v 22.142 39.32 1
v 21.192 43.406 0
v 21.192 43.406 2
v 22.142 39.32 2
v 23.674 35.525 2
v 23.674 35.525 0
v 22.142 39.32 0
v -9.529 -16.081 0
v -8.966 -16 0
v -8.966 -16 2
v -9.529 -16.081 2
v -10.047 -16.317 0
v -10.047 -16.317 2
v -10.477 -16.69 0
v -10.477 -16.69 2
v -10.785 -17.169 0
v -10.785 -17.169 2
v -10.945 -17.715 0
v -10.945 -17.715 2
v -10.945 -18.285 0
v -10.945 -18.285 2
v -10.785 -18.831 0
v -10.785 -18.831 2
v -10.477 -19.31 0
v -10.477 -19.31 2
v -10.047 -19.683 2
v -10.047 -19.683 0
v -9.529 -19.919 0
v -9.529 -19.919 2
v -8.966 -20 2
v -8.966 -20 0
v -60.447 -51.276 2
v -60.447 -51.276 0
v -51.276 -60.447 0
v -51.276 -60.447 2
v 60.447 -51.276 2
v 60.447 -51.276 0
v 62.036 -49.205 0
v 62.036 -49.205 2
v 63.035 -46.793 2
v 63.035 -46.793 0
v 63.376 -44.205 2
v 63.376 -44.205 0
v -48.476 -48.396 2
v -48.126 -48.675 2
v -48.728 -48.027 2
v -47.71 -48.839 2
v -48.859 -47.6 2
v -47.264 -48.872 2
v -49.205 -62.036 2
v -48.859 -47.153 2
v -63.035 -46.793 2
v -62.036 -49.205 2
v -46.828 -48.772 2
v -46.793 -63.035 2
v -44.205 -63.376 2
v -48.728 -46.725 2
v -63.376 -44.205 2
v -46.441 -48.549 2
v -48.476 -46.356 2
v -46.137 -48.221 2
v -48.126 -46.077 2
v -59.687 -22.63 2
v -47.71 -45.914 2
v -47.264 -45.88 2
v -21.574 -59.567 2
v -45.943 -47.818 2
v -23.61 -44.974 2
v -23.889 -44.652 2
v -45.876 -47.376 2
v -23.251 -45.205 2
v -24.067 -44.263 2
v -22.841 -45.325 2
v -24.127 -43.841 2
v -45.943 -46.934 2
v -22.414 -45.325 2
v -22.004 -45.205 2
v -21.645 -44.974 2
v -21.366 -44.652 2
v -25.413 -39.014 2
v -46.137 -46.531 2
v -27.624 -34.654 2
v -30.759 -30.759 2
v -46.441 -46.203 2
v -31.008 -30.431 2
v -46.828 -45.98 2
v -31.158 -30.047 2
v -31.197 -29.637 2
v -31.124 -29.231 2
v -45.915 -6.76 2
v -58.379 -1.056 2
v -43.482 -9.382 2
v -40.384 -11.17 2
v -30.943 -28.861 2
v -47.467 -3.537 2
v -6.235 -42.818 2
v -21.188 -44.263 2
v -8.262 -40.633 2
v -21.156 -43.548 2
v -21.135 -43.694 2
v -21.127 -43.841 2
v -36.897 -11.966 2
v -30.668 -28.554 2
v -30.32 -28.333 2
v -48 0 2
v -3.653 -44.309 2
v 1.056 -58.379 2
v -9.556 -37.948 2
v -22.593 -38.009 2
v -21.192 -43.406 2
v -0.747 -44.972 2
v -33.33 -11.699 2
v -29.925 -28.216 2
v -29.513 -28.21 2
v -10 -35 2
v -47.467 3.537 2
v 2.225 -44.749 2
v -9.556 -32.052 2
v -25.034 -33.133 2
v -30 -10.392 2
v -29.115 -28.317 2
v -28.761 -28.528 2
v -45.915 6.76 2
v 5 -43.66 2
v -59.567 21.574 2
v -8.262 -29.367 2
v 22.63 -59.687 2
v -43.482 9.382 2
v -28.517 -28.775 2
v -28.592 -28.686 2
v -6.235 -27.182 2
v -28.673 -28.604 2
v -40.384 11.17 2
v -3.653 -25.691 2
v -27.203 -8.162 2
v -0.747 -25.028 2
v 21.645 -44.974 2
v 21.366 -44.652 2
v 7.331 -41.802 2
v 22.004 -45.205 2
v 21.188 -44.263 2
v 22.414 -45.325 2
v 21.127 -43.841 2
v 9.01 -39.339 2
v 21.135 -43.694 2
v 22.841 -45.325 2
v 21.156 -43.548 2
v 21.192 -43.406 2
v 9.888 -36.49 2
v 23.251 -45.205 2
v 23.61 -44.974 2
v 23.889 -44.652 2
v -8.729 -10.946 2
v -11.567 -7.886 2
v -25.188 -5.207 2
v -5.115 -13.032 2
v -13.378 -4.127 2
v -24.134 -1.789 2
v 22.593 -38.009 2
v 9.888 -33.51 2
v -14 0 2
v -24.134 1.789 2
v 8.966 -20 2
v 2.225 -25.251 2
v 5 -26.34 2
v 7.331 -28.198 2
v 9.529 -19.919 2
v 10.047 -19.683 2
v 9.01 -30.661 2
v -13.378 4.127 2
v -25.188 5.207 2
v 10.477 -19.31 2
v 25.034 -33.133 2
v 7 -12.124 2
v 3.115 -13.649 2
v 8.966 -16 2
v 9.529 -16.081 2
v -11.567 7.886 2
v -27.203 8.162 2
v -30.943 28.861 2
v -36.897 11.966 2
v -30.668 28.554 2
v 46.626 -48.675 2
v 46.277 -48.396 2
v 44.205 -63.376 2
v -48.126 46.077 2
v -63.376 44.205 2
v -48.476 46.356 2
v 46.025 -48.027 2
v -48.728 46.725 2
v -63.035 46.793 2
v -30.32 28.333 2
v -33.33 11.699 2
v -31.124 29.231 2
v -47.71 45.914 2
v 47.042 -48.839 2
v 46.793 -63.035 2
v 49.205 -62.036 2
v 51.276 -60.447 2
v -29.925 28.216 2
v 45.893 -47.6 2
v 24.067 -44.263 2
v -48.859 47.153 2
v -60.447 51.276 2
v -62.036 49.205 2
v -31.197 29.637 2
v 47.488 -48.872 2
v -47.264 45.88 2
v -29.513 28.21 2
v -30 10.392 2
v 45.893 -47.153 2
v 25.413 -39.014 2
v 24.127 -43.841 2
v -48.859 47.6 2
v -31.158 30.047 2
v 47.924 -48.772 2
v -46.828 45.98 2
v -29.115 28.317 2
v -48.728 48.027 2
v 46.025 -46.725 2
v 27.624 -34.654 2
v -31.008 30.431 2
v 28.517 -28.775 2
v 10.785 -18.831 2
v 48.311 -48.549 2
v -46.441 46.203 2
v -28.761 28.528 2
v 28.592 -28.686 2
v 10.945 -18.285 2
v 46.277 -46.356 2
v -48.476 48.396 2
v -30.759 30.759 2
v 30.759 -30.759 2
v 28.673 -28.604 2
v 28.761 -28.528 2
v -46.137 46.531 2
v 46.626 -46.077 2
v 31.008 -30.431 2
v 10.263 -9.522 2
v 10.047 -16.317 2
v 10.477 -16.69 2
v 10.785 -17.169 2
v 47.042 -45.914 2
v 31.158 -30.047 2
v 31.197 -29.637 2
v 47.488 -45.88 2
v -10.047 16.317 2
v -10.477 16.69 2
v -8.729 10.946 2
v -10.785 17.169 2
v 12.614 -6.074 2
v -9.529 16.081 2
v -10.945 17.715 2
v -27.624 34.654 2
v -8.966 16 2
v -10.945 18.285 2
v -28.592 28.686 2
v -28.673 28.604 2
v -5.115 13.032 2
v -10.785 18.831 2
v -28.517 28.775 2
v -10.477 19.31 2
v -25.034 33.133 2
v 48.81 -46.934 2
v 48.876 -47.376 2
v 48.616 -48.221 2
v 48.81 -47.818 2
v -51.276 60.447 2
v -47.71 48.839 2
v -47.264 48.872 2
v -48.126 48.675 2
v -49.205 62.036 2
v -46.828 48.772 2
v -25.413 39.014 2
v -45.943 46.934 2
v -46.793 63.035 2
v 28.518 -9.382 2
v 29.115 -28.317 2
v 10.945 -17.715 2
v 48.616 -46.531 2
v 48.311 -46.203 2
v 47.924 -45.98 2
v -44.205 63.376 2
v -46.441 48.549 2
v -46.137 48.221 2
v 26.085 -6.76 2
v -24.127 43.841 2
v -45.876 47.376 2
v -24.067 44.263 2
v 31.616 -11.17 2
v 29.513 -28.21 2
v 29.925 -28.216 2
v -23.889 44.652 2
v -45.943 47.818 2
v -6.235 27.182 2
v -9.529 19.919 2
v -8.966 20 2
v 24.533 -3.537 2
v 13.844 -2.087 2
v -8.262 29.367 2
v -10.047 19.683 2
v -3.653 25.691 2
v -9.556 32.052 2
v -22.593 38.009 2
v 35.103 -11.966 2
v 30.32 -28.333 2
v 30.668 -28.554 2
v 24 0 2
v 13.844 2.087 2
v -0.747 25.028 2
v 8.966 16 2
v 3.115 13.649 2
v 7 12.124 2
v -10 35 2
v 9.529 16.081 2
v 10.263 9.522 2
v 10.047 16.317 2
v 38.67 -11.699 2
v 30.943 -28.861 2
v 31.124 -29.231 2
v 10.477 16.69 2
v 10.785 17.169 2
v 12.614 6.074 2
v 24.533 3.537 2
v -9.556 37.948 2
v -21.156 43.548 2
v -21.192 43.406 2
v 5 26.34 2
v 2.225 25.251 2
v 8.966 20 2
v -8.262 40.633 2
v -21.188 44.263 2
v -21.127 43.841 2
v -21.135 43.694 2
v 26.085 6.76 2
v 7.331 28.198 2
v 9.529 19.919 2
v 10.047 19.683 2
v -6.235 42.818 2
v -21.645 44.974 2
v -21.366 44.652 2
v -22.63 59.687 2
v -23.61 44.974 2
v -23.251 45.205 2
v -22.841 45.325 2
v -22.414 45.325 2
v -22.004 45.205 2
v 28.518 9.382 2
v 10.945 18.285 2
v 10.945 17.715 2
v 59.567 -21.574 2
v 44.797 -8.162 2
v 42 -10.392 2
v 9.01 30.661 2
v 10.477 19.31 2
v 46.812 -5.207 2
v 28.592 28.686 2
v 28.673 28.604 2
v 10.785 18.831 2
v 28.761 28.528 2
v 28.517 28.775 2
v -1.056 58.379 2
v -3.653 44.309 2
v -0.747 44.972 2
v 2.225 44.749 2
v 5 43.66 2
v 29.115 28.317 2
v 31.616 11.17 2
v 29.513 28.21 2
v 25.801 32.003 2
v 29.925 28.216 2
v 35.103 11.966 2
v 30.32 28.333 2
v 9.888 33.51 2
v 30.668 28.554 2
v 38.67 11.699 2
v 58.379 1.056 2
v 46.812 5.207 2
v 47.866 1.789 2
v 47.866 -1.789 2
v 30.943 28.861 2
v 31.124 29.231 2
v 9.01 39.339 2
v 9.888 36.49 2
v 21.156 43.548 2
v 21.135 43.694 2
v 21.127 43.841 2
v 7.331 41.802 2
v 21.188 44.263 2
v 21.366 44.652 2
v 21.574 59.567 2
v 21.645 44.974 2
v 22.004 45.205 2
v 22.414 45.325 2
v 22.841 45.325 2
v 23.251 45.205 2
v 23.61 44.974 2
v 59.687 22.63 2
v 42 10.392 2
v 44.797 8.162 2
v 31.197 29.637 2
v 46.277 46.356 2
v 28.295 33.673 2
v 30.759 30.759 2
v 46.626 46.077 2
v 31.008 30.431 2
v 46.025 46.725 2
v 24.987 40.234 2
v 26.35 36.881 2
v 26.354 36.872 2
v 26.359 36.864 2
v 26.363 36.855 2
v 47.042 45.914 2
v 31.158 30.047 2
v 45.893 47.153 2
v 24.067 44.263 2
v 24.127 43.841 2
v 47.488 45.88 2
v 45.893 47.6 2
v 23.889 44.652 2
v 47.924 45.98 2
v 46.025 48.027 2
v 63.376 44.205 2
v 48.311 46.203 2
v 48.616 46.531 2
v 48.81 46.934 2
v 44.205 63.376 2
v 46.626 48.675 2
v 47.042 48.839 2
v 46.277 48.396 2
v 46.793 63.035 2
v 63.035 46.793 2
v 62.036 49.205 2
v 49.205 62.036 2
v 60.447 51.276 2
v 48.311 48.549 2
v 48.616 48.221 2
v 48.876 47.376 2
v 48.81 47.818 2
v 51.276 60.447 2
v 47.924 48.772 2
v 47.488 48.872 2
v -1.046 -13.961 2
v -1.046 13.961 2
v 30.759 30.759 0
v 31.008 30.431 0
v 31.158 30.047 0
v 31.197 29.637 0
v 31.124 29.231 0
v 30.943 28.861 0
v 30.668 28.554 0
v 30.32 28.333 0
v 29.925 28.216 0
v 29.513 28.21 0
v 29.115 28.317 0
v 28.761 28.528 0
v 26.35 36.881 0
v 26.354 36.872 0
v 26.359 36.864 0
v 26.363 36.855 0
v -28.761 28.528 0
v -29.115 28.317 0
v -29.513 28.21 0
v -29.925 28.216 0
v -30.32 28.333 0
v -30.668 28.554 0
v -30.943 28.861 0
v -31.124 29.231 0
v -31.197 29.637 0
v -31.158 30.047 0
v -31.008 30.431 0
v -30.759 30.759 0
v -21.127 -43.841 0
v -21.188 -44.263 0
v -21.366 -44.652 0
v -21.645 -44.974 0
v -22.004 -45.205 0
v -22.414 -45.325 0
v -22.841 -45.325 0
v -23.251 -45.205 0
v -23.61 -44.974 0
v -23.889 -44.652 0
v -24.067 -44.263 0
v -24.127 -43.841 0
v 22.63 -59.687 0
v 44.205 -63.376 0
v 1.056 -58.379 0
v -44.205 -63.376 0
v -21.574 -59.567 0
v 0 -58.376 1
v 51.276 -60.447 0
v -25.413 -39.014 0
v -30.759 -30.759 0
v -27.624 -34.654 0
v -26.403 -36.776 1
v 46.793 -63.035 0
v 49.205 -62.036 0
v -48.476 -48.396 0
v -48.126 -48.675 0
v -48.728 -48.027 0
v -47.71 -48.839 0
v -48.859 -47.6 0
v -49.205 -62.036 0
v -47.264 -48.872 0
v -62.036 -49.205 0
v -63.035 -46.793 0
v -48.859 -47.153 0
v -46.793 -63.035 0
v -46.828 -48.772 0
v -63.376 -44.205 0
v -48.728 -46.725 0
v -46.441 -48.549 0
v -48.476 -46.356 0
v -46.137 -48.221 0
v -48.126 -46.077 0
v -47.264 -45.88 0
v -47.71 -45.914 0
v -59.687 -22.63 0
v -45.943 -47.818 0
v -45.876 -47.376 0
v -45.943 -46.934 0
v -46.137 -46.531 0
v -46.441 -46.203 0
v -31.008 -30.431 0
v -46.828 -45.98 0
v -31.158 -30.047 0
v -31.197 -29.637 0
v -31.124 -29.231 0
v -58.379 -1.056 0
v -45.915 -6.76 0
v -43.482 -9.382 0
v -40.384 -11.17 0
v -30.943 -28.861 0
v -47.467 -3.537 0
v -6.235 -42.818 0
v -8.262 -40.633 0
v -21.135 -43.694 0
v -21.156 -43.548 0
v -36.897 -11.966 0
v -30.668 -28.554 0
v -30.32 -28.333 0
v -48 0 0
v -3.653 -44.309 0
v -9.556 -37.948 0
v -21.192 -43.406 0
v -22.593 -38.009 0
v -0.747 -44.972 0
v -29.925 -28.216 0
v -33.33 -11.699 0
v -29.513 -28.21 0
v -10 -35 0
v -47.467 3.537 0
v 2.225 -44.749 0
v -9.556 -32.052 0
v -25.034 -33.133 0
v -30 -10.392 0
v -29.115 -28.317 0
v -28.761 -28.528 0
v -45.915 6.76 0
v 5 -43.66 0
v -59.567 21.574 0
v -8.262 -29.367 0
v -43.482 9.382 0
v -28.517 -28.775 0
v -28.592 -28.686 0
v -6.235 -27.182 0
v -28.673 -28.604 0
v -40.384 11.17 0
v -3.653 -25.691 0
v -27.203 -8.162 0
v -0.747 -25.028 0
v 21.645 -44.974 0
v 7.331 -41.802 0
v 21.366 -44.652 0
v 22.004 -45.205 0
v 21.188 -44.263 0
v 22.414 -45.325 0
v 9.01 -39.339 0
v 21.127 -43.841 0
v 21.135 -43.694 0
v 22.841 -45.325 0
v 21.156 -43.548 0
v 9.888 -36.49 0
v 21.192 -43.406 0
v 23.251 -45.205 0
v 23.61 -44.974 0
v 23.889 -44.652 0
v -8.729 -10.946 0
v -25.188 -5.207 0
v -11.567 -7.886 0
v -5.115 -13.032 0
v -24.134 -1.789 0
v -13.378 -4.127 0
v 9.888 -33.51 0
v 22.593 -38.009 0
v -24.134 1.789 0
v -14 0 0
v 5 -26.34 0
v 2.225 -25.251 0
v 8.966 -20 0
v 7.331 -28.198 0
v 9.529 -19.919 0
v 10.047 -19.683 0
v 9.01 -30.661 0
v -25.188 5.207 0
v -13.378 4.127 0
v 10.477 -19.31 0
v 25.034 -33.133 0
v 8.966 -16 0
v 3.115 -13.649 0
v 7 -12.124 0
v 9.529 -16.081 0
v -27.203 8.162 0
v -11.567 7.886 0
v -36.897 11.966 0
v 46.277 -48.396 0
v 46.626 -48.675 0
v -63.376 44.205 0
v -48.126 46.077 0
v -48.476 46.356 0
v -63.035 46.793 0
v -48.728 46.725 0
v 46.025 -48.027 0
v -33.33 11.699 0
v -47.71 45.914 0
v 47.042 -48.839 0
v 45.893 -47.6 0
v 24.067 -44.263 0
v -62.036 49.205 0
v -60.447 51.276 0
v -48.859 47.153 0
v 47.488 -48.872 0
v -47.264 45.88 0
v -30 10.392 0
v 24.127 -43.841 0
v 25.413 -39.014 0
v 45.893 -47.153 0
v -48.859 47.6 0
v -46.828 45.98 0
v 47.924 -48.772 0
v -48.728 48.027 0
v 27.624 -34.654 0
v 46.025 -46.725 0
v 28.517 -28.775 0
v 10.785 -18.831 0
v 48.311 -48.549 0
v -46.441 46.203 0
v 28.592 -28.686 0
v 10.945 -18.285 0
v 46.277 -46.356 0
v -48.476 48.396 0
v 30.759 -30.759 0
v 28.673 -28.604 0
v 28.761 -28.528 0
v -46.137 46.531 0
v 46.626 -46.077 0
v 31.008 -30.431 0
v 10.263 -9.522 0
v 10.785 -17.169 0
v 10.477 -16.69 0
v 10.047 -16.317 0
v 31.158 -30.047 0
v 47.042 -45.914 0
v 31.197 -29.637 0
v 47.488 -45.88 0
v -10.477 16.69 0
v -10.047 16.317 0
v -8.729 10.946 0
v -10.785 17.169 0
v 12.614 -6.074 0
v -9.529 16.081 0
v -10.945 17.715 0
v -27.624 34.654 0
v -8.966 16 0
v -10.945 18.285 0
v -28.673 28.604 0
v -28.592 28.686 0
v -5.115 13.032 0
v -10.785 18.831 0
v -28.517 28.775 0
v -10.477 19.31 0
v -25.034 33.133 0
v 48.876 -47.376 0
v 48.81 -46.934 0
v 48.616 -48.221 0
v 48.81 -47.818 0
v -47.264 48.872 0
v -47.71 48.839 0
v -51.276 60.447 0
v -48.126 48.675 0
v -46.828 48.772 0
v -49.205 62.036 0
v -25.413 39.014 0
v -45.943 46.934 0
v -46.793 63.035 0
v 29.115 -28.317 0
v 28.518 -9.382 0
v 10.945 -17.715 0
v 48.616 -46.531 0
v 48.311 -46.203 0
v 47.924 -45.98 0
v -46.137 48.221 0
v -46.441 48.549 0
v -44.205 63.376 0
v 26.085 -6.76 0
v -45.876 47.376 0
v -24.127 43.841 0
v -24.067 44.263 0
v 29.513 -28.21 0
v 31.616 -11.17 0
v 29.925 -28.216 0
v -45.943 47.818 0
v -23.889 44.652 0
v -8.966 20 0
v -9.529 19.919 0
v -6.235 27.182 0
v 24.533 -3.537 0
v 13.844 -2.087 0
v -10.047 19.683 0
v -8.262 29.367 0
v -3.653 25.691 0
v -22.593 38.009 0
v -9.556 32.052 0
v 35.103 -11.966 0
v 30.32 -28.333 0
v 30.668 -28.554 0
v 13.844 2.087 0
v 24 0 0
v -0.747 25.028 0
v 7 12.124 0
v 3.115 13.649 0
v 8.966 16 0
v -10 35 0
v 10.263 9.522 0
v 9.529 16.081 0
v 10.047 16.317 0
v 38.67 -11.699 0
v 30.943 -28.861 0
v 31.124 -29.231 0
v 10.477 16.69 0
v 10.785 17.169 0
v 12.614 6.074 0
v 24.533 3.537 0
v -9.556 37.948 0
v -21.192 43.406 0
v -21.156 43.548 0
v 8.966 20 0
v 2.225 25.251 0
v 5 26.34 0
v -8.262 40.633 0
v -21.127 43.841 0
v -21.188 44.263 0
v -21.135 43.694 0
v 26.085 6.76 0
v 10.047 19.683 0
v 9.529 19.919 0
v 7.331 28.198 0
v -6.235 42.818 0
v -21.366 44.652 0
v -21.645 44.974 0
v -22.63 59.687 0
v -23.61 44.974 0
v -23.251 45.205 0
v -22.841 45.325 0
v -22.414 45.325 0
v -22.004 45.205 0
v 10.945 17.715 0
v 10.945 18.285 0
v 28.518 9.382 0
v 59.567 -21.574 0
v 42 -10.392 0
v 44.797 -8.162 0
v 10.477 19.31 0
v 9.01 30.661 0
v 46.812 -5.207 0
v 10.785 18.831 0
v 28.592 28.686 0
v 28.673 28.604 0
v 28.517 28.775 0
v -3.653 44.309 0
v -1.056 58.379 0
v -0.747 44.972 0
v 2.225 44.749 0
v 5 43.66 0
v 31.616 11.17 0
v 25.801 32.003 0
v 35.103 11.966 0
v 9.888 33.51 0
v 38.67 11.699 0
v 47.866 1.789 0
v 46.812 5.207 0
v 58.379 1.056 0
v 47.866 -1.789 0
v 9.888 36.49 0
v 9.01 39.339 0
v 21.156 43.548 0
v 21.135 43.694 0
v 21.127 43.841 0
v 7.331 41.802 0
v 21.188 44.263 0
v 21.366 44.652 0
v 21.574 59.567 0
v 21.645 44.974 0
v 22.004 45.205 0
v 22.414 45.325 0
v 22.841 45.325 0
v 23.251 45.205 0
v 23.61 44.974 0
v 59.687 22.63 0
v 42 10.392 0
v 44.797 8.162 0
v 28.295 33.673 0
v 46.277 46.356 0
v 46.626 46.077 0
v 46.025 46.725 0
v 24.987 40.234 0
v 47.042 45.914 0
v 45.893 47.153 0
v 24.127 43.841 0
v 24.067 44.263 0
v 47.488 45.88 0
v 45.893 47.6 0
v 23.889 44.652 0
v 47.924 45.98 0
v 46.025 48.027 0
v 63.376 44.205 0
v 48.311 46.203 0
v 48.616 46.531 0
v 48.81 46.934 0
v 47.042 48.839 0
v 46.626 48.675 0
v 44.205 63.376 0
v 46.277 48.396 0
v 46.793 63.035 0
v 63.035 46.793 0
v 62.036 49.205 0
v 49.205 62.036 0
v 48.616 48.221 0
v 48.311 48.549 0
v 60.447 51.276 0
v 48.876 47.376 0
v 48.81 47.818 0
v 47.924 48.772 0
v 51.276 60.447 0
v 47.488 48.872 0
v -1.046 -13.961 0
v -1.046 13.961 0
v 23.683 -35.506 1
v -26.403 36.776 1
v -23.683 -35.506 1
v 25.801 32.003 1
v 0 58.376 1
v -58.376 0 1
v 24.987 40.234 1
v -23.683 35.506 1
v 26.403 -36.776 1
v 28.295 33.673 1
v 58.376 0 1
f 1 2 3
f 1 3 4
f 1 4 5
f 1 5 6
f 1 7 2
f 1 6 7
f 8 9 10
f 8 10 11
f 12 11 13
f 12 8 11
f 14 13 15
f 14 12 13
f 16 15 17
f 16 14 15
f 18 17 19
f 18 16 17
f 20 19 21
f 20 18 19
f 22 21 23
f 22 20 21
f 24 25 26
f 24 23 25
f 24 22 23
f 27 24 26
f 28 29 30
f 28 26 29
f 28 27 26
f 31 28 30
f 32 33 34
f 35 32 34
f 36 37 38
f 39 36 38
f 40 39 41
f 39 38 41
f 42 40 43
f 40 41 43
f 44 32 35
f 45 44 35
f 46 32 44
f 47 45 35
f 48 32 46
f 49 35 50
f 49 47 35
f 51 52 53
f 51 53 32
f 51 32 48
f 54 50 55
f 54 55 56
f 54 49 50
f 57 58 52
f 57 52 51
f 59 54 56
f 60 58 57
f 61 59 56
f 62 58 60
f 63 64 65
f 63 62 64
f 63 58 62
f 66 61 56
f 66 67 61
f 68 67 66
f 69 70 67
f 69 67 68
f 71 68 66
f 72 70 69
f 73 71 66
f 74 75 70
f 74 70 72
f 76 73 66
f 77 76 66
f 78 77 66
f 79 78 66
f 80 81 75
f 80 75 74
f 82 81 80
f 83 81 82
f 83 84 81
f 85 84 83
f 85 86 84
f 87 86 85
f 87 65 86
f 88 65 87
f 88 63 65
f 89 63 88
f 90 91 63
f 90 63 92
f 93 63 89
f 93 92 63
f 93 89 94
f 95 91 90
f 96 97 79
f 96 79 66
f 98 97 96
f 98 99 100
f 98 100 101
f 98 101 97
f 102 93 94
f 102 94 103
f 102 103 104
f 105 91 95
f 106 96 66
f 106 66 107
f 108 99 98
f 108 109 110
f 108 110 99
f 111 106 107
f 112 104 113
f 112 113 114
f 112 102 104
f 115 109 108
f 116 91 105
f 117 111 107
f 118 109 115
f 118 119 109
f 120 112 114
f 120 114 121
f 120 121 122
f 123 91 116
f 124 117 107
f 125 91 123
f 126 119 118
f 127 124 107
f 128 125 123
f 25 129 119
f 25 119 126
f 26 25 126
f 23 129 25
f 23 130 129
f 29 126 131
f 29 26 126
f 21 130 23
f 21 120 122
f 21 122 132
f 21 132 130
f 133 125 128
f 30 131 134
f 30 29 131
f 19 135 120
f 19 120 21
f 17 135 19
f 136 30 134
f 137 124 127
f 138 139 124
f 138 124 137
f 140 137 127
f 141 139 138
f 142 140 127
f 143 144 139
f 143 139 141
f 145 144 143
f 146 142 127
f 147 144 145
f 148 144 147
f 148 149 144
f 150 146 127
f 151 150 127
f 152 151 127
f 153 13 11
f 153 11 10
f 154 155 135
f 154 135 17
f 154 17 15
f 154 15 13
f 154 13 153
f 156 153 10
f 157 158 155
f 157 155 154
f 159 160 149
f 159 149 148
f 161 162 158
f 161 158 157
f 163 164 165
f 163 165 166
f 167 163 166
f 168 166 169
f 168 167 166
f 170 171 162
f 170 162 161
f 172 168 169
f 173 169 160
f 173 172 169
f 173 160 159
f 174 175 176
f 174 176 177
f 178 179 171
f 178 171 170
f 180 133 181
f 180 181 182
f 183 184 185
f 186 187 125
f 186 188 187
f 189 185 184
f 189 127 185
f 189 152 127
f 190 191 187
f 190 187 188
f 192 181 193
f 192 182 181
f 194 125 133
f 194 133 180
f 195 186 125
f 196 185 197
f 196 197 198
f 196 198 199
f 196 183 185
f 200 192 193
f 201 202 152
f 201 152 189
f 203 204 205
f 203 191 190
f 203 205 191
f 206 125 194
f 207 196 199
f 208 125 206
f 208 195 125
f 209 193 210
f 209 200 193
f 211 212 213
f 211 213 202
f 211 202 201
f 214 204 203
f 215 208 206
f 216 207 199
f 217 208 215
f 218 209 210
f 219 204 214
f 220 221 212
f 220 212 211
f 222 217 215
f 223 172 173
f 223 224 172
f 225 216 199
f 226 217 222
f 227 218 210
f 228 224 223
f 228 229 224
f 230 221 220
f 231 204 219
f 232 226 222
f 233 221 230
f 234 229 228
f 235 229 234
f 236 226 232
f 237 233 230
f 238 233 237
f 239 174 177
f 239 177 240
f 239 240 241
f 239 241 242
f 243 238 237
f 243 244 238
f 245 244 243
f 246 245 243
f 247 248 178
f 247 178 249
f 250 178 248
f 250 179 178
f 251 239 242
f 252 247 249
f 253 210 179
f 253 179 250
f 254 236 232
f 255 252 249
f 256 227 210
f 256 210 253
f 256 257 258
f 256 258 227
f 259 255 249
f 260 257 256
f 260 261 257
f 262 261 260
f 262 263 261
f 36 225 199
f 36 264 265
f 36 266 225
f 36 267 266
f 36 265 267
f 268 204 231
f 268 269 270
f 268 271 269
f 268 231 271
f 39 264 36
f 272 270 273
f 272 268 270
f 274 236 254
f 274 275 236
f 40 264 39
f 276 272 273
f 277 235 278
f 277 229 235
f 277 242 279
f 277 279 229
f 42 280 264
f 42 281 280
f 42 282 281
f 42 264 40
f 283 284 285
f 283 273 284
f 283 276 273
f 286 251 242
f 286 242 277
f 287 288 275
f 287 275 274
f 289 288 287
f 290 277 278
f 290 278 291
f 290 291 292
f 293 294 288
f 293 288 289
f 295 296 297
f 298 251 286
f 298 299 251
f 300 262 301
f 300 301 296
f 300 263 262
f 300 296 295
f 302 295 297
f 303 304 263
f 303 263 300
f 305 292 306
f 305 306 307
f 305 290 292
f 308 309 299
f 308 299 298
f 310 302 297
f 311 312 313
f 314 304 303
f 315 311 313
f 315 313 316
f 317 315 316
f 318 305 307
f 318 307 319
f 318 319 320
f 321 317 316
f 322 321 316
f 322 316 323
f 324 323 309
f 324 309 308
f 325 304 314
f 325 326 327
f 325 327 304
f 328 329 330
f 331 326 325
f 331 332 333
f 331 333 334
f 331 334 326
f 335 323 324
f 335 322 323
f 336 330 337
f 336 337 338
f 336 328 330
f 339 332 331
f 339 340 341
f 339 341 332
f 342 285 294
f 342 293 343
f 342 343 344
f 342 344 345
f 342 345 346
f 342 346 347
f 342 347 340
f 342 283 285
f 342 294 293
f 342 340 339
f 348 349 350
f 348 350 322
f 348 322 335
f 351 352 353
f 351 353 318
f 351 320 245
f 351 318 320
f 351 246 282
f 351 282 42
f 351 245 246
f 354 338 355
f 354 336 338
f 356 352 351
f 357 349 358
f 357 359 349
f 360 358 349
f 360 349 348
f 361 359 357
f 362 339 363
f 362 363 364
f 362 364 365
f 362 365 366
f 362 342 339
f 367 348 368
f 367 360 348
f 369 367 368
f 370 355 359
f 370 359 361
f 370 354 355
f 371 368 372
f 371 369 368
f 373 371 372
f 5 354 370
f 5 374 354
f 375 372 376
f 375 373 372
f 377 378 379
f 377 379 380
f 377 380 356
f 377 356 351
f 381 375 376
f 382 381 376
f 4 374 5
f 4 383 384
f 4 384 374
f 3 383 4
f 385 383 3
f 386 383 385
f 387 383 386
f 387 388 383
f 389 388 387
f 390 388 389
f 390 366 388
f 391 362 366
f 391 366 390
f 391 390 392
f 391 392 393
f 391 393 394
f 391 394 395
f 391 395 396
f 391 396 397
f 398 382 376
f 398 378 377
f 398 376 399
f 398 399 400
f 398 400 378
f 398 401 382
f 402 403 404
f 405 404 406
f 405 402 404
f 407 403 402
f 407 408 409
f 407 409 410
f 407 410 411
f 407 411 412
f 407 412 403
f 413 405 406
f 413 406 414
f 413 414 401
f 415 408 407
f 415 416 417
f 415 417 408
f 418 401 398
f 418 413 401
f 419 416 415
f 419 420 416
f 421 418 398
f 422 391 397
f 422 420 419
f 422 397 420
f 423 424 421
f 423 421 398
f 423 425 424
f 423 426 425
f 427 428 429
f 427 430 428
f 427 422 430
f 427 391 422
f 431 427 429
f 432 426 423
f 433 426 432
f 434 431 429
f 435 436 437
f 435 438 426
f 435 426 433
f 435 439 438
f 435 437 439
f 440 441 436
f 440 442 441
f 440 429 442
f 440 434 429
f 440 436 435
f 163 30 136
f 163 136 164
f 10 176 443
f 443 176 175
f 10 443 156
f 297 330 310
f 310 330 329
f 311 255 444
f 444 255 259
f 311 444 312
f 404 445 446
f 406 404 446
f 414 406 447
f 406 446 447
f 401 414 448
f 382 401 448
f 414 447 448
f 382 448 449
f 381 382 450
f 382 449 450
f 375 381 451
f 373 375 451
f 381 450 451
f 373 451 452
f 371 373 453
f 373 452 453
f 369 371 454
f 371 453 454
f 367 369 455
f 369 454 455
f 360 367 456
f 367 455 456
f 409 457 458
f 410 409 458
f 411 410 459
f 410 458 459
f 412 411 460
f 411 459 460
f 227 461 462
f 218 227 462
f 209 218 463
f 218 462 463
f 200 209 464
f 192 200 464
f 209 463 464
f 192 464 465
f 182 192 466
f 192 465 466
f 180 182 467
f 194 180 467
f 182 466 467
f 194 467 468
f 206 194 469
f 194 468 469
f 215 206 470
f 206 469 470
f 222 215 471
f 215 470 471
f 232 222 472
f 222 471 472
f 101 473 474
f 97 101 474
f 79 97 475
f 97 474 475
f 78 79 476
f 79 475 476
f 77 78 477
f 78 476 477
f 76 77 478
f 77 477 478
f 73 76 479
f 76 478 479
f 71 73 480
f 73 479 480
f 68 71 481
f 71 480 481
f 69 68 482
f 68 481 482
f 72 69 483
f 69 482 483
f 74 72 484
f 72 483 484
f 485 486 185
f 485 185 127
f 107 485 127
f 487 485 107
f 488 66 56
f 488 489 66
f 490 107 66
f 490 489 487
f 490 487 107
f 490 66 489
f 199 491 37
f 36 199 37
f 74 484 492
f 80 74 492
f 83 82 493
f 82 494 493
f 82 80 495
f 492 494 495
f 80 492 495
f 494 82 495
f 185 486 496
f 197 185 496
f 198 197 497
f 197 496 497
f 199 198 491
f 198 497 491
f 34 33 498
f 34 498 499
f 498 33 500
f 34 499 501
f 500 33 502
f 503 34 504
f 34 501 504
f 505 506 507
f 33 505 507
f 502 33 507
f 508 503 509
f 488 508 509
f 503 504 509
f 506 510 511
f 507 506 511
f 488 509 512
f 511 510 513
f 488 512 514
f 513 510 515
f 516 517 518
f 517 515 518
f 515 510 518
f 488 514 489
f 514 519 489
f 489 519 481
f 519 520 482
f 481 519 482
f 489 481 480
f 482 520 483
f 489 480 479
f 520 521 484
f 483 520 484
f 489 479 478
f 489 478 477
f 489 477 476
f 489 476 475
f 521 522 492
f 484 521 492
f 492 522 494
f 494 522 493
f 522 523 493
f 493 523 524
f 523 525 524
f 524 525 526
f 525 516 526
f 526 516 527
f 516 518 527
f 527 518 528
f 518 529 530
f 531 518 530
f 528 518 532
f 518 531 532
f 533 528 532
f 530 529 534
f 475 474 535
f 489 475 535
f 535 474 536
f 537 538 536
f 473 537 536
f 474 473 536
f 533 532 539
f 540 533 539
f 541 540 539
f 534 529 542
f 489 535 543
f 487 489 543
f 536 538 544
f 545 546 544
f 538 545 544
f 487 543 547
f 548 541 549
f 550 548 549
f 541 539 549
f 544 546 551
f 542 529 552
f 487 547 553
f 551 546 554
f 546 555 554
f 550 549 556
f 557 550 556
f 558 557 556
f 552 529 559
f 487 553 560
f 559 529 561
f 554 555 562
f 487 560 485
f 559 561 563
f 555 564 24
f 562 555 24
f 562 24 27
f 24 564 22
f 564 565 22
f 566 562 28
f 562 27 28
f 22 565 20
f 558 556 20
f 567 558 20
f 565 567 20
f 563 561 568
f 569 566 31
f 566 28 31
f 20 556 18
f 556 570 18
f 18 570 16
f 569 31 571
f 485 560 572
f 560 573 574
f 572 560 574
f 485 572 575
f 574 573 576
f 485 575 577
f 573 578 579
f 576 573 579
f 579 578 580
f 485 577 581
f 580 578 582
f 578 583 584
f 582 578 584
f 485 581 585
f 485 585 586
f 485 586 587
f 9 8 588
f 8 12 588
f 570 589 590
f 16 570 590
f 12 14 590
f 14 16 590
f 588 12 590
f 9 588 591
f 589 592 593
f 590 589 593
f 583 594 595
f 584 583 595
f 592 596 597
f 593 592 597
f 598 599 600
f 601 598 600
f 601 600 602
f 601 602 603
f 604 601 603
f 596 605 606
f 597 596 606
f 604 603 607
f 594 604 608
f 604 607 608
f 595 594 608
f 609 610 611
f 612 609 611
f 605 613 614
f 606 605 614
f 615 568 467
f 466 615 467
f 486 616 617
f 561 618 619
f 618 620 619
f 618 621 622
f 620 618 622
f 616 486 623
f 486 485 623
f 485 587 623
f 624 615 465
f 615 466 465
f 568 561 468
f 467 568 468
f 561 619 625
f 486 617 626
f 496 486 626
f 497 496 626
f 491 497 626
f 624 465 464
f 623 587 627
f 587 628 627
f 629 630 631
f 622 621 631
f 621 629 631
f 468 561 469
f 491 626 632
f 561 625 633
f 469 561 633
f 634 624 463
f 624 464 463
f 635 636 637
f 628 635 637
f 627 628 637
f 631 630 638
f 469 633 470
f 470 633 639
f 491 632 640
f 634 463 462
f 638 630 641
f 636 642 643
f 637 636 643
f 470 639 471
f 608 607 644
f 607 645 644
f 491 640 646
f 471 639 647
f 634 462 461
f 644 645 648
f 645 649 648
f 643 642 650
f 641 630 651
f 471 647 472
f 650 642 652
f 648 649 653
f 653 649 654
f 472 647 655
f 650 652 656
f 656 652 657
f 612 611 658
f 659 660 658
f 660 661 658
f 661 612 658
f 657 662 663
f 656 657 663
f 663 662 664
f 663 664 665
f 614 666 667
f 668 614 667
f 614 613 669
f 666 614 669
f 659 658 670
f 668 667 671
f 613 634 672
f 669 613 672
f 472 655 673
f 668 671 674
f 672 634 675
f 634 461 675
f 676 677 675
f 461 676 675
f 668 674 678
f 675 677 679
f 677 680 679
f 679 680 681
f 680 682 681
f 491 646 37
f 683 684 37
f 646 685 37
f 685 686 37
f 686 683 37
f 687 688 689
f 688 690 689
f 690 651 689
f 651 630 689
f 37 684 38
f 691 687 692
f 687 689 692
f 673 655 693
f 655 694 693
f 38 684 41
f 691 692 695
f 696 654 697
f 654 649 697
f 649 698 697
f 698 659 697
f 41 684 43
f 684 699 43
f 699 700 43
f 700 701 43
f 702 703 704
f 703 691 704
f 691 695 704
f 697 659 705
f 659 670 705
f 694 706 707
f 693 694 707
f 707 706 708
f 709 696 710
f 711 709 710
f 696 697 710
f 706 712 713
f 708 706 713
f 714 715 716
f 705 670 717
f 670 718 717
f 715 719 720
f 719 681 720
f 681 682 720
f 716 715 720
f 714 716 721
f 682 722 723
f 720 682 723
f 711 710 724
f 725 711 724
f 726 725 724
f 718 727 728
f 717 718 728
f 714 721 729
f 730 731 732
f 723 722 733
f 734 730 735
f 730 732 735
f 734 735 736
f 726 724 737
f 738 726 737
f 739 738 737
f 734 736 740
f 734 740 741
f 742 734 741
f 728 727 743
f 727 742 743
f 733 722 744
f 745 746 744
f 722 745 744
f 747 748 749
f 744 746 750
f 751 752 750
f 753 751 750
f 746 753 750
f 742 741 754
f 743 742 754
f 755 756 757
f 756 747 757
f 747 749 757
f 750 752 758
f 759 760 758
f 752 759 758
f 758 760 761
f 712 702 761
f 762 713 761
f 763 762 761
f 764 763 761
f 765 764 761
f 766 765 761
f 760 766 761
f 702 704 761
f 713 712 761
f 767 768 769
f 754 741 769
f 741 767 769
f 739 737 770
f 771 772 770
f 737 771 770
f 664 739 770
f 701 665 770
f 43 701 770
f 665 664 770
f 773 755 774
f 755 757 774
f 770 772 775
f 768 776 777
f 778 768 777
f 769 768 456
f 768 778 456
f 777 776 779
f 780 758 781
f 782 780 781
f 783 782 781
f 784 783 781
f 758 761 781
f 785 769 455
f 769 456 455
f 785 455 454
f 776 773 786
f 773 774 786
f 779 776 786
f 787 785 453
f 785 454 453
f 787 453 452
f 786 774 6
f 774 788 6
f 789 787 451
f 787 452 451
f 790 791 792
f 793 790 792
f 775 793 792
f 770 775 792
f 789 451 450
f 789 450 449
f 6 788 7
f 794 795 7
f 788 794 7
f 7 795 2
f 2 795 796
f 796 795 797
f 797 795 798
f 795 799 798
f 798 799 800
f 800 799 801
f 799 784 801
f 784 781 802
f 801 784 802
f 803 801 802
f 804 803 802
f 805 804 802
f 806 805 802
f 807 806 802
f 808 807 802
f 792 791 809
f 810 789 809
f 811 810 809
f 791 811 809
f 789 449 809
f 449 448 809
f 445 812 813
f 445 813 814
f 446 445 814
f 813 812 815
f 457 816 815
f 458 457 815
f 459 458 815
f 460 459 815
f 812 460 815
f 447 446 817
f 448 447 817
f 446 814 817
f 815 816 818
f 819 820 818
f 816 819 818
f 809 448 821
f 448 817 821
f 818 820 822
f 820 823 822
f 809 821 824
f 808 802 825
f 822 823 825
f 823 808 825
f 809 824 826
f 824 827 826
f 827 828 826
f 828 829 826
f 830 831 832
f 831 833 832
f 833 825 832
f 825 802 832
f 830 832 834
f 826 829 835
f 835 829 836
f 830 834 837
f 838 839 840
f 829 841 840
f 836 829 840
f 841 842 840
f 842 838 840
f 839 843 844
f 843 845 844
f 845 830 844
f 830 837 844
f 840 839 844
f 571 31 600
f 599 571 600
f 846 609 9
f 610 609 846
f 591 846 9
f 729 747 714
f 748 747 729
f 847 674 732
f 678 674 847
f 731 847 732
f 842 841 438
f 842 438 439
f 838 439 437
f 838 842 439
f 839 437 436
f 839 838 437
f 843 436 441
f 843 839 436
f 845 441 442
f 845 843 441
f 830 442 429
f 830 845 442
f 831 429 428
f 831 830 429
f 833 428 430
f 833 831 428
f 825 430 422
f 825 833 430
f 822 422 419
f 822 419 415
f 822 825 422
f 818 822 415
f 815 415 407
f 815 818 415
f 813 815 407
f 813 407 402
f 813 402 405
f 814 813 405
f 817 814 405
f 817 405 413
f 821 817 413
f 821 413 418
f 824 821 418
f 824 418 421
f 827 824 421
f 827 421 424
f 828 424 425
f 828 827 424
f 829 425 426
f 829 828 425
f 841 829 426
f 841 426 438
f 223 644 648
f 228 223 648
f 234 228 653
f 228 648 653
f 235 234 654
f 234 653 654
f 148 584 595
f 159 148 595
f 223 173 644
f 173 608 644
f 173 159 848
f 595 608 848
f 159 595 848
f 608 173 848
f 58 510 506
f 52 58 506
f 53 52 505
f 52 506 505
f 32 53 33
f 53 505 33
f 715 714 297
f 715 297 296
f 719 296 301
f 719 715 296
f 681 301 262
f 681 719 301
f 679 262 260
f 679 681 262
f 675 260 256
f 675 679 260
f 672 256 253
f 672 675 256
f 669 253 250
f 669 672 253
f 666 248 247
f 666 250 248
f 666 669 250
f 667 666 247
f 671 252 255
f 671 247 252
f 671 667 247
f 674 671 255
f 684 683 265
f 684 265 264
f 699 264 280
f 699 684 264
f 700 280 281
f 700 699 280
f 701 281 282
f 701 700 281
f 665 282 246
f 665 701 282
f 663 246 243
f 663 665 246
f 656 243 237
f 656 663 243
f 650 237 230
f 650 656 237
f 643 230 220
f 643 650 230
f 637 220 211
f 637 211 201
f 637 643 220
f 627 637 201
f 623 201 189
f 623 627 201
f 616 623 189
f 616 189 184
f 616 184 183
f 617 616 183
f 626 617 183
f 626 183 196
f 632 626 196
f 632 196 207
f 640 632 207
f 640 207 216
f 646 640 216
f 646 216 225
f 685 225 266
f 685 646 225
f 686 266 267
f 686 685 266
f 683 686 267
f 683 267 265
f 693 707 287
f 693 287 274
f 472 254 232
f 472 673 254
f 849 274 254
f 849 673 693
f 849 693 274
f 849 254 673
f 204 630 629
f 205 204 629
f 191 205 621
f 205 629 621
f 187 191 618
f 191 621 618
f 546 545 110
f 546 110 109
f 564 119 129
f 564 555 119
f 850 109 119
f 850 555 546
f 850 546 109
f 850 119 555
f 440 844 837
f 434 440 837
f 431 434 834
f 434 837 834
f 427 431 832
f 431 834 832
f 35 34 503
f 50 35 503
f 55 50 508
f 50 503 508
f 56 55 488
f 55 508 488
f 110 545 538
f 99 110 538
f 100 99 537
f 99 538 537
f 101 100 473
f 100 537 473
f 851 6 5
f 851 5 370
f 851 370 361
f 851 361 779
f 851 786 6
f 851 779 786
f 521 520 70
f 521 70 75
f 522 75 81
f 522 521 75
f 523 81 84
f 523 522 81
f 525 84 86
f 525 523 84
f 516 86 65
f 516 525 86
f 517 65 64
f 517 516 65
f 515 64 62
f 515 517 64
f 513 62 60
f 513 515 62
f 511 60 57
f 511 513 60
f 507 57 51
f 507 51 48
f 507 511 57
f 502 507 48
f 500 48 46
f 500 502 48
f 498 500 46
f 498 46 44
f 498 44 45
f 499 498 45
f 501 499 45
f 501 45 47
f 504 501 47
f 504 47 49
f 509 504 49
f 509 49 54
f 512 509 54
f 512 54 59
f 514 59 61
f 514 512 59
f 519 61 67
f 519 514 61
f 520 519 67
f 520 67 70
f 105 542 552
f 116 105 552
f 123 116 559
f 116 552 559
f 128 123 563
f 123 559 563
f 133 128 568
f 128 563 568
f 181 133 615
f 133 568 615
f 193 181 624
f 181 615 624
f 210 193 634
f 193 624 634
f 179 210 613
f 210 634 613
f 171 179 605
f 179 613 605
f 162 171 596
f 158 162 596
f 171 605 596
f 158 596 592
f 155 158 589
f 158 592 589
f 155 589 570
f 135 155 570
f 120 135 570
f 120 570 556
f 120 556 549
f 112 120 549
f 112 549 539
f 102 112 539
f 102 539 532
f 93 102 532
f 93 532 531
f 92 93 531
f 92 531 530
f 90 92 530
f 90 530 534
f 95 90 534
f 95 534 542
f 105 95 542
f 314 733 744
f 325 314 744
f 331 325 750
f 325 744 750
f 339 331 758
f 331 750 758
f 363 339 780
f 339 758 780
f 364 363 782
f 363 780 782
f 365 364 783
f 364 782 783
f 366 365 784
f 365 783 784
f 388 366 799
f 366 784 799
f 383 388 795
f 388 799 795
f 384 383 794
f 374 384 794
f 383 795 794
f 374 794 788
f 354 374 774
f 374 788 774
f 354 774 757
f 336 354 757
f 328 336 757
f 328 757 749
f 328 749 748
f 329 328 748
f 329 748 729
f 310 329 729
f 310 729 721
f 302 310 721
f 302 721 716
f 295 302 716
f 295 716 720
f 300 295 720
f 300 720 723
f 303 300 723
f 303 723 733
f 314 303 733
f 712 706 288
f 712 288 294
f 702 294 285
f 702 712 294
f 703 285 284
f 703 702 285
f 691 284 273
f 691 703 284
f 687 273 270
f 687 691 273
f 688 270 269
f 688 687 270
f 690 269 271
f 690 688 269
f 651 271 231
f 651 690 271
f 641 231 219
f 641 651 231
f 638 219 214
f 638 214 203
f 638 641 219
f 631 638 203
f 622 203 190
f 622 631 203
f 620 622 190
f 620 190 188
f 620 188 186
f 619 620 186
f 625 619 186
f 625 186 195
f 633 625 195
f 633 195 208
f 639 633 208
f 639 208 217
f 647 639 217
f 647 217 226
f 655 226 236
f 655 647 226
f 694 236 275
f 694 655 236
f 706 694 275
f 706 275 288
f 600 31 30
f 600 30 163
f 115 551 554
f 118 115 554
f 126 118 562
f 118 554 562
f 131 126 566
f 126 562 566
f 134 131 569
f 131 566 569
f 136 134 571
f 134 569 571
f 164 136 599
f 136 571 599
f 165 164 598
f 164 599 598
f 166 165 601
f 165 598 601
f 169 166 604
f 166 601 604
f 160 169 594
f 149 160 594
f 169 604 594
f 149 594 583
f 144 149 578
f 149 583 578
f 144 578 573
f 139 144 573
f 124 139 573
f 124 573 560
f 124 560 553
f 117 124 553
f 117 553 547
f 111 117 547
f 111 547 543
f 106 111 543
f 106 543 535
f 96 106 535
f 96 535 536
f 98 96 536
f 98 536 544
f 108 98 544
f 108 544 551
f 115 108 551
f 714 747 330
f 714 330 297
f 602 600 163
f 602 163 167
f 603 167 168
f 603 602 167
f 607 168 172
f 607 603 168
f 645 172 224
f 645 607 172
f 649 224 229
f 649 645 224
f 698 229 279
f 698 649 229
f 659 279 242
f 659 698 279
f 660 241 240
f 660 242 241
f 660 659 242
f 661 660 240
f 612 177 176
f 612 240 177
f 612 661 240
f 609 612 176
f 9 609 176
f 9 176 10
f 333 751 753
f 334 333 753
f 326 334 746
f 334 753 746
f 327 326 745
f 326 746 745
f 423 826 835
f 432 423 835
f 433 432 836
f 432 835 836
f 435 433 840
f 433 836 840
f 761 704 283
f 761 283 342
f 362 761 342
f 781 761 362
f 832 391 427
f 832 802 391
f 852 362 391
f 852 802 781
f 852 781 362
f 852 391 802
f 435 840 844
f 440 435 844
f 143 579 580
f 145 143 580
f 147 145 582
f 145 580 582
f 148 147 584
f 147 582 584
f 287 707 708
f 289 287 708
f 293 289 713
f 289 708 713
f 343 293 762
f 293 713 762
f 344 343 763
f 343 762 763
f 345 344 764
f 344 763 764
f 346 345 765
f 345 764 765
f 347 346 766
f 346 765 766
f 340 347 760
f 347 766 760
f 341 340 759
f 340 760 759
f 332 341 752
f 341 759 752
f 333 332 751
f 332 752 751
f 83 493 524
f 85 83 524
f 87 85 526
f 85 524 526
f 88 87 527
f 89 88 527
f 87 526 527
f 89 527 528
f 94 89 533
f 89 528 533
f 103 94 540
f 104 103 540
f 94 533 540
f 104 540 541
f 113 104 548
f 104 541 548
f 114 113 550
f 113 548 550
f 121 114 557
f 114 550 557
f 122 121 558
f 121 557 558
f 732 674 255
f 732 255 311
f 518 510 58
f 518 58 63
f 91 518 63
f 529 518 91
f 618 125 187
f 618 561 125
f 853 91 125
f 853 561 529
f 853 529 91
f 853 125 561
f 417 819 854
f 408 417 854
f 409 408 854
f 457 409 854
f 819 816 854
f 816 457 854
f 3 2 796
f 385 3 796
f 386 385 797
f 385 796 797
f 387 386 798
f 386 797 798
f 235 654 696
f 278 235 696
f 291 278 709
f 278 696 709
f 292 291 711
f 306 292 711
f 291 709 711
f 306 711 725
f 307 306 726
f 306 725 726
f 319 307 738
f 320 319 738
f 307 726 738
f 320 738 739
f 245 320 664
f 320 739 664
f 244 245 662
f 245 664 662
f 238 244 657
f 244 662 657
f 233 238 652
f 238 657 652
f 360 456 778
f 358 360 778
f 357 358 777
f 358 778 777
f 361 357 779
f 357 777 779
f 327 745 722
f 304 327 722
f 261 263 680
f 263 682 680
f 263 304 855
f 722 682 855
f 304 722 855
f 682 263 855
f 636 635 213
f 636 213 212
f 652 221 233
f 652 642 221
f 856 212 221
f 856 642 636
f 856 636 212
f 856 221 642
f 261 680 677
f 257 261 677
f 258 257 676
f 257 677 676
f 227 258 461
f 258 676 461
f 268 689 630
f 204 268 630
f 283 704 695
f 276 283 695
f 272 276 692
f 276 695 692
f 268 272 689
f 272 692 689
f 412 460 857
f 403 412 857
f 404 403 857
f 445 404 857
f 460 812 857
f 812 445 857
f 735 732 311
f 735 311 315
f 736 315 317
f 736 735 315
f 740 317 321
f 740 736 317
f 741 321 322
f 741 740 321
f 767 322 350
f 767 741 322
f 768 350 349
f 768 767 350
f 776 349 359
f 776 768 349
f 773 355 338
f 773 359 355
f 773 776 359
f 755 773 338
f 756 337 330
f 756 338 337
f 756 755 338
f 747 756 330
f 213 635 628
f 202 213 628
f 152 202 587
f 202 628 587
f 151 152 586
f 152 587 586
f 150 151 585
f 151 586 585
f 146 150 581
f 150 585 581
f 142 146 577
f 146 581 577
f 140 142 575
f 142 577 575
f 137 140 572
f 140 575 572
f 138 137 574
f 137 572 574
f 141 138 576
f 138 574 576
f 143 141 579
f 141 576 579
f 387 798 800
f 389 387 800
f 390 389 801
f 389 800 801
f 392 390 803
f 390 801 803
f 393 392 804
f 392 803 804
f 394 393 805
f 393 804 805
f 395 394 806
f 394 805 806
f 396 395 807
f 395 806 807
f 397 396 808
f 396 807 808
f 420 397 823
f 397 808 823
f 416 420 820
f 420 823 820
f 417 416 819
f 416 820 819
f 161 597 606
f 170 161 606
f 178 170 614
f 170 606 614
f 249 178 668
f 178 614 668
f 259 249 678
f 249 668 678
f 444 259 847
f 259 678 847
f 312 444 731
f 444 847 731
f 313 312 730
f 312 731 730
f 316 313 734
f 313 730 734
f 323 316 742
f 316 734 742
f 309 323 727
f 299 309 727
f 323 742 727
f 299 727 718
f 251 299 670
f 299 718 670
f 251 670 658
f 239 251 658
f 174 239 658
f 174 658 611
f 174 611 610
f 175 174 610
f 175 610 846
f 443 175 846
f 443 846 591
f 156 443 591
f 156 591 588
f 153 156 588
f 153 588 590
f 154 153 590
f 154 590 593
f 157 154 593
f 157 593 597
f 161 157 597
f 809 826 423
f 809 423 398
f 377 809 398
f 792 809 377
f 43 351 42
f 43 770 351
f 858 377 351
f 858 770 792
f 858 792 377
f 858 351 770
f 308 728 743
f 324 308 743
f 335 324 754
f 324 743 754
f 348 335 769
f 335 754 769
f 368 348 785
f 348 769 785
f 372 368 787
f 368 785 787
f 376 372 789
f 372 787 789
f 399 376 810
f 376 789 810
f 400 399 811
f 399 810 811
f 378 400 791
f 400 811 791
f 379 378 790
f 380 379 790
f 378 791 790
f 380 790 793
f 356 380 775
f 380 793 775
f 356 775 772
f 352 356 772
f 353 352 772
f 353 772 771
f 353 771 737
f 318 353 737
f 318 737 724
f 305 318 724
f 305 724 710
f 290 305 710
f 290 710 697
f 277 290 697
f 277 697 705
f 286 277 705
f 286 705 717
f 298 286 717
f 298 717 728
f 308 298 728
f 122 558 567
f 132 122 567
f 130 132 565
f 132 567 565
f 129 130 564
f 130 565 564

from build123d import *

# Parameters (mm, degrees)
SKETCH1_R           = 1.5
BOSS_EXTRUDE1_DEPTH = 2
SKETCH4_R           = 14
SKETCH4_R_2         = 12
SKETCH4_R_3         = 10
CUT_EXTRUDE1_DEPTH  = 10


with BuildPart() as part:
    # Sketch1 → Boss-Extrude1 (new body)
    with BuildSketch(Plane.XY):
        with BuildLine():
            Line((60.447222151, 51.275649276), (51.275649276, 60.447222151))
            ThreePointArc((51.275649276, 60.447222151), (48.031415788, 62.614949665), (44.204581464, 63.376154339))
            add(Edge.make_bspline(
                [(-44.204581464, 63.376154339), (0, 53.376154339), (44.204581464, 63.376154339)],
                knots=[0, 0, 0, 1, 1, 1], degree=2))
            ThreePointArc((-44.204581464, 63.376154339), (-48.031415788, 62.614949665), (-51.275649276, 60.447222151))
            Line((-51.275649276, 60.447222151), (-60.447222151, 51.275649276))
            ThreePointArc((-60.447222151, 51.275649276), (-62.614949665, 48.031415788), (-63.376154339, 44.204581464))
            add(Edge.make_bspline(
                [(-63.376154339, -44.204581464), (-53.376154339, 0), (-63.376154339, 44.204581464)],
                knots=[0, 0, 0, 1, 1, 1], degree=2))
            ThreePointArc((-63.376154339, -44.204581464), (-62.614949665, -48.031415788), (-60.447222151, -51.275649276))
            Line((-60.447222151, -51.275649276), (-51.275649276, -60.447222151))
            ThreePointArc((-51.275649276, -60.447222151), (-48.031415788, -62.614949665), (-44.204581464, -63.376154339))
            add(Edge.make_bspline(
                [(44.204581464, -63.376154339), (0, -53.376154339), (-44.204581464, -63.376154339)],
                knots=[0, 0, 0, 1, 1, 1], degree=2))
            ThreePointArc((44.204581464, -63.376154339), (48.031415788, -62.614949665), (51.275649276, -60.447222151))
            Line((51.275649276, -60.447222151), (60.447222151, -51.275649276))
            ThreePointArc((60.447222151, -51.275649276), (62.614949665, -48.031415788), (63.376154339, -44.204581464))
            add(Edge.make_bspline(
                [(63.376154339, 44.204581464), (53.376154339, 0), (63.376154339, -44.204581464)],
                knots=[0, 0, 0, 1, 1, 1], degree=2))
            ThreePointArc((63.376154339, 44.204581464), (62.614949665, 48.031415788), (60.447222151, 51.275649276))
        make_face()
        with Locations((-47.376154339, -47.37615434)):
            Circle(SKETCH1_R, mode=Mode.SUBTRACT)
        with BuildLine():
            ThreePointArc((-28.761031711, -28.527510136), (-28.631586297, -28.644099888), (-28.51653182, -28.774911786))
            add(Edge.make_bspline(
                [(-21.191797917, -43.405881611), (-22.512426592, -34.921752495), (-28.516531822, -28.774911788)],
                knots=[0.024414386, 0.024414386, 0.024414386, 0.9806816, 0.9806816, 0.9806816], degree=2))
            ThreePointArc((-21.191797914, -43.40588161), (-21.143599518, -43.62088039), (-21.127416998, -43.840620434))
            ThreePointArc((-21.127416998, -43.840620434), (-22.627416998, -45.340620434), (-24.127416998, -43.840620434))
            add(Edge.make_bspline(
                [(-24.127416998, -43.840620434), (-25.362407372, -36.251653189), (-30.759144982, -30.759144982)],
                knots=[0, 0, 0, 1, 1, 1], degree=2))
            ThreePointArc((-30.759144982, -30.759144982), (-30.816001484, -28.697906735), (-28.761031711, -28.527510136))
        make_face(mode=Mode.SUBTRACT)
        with BuildLine():
            add(Edge.make_bspline(
                [(24.127416998, -43.840620434), (25.362407372, -36.251653189), (30.759144982, -30.759144982)],
                knots=[0, 0, 0, 1, 1, 1], degree=2))
            ThreePointArc((24.127416998, -43.840620434), (22.627416998, -45.340620434), (21.127416998, -43.840620434))
            ThreePointArc((21.127416998, -43.840620434), (21.143599518, -43.62088039), (21.191797914, -43.40588161))
            add(Edge.make_bspline(
                [(21.191797917, -43.405881611), (22.512426592, -34.921752495), (28.516531822, -28.774911788)],
                knots=[0.024414386, 0.024414386, 0.024414386, 0.9806816, 0.9806816, 0.9806816], degree=2))
            ThreePointArc((28.51653182, -28.774911786), (28.631586297, -28.644099888), (28.761031711, -28.527510136))
            ThreePointArc((28.761031711, -28.527510136), (30.816001484, -28.697906735), (30.759144982, -30.759144982))
        make_face(mode=Mode.SUBTRACT)
        with Locations((47.376154339, -47.376154339)):
            Circle(SKETCH1_R, mode=Mode.SUBTRACT)
        with Locations((-47.376154339, 47.376154339)):
            Circle(SKETCH1_R, mode=Mode.SUBTRACT)
        with BuildLine():
            add(Edge.make_bspline(
                [(-24.127416998, 43.840620434), (-25.362407372, 36.251653189), (-30.759144982, 30.759144982)],
                knots=[0, 0, 0, 1, 1, 1], degree=2))
            ThreePointArc((-24.127416998, 43.840620434), (-22.627416998, 45.340620434), (-21.127416998, 43.840620434))
            ThreePointArc((-21.127416998, 43.840620434), (-21.143599518, 43.62088039), (-21.191797914, 43.40588161))
            add(Edge.make_bspline(
                [(-21.191797917, 43.405881611), (-22.512426592, 34.921752495), (-28.516531822, 28.774911788)],
                knots=[0.024414386, 0.024414386, 0.024414386, 0.9806816, 0.9806816, 0.9806816], degree=2))
            ThreePointArc((-28.51653182, 28.774911786), (-28.631586297, 28.644099888), (-28.761031711, 28.527510136))
            ThreePointArc((-28.761031711, 28.527510136), (-30.816001484, 28.697906735), (-30.759144982, 30.759144982))
        make_face(mode=Mode.SUBTRACT)
        with BuildLine():
            ThreePointArc((28.761031711, 28.527510136), (28.631586297, 28.644099888), (28.51653182, 28.774911786))
            add(Edge.make_bspline(
                [(23.673604803, 35.525452482), (25.506528794, 31.856471559), (28.516531822, 28.774911788)],
                knots=[0.501281739, 0.501281739, 0.501281739, 0.9806816, 0.9806816, 0.9806816], degree=2))
            add(Edge.make_bspline(
                [(21.191797917, 43.405881611), (21.850363527, 39.175051421), (23.673604803, 35.525452482)],
                knots=[0.024414386, 0.024414386, 0.024414386, 0.501281739, 0.501281739, 0.501281739], degree=2))
            ThreePointArc((21.191797914, 43.40588161), (21.143599518, 43.62088039), (21.127416998, 43.840620434))
            ThreePointArc((21.127416998, 43.840620434), (22.627416998, 45.340620434), (24.127416998, 43.840620434))
            add(Edge.make_bspline(
                [(24.127416998, 43.840620434), (24.734971072, 40.107224563), (26.349731434, 36.881203745)],
                knots=[0, 0, 0, 0.491950453, 0.491950453, 0.491950453], degree=2))
            ThreePointArc((26.349731434, 36.881203745), (26.356395509, 36.86807251), (26.362930356, 36.854876488))
            add(Edge.make_bspline(
                [(26.362930356, 36.854876488), (28.028171669, 33.538582193), (30.759144982, 30.759144982)],
                knots=[0.493958478, 0.493958478, 0.493958478, 1, 1, 1], degree=2))
            ThreePointArc((30.759144982, 30.759144982), (30.816001484, 28.697906735), (28.761031711, 28.527510136))
        make_face(mode=Mode.SUBTRACT)
        with Locations((47.376154339, 47.376154339)):
            Circle(SKETCH1_R, mode=Mode.SUBTRACT)
    extrude(amount=BOSS_EXTRUDE1_DEPTH)

    # Sketch4 → Cut-Extrude1 (cut)
    with BuildSketch(Plane(origin=(0, 0, 0), x_dir=(-1, 0, 0), z_dir=(0, 0, -1))):
        Circle(SKETCH4_R)
        with Locations((-36, 0)):
            Circle(SKETCH4_R_2)
        with Locations((36, 0)):
            Circle(SKETCH4_R_2)
        with Locations((0, 35)):
            Circle(SKETCH4_R_3)
        with Locations((0, -35)):
            Circle(SKETCH4_R_3)
        with BuildLine():
            Line((-8.965692962, 20), (8.965692962, 20))
            ThreePointArc((8.965692962, 20), (10.965692962, 18), (8.965692962, 16))
            Line((8.965692962, 16), (-8.965692962, 16))
            ThreePointArc((-8.965692962, 16), (-10.965692962, 18), (-8.965692962, 20))
        make_face()
        with BuildLine():
            Line((8.965692962, -20), (-8.965692962, -20))
            ThreePointArc((-8.965692962, -20), (-10.965692962, -18), (-8.965692962, -16))
            Line((-8.965692962, -16), (8.965692962, -16))
            ThreePointArc((8.965692962, -16), (10.965692962, -18), (8.965692962, -20))
        make_face()
    extrude(amount=-CUT_EXTRUDE1_DEPTH, mode=Mode.SUBTRACT)


solid = part.part
